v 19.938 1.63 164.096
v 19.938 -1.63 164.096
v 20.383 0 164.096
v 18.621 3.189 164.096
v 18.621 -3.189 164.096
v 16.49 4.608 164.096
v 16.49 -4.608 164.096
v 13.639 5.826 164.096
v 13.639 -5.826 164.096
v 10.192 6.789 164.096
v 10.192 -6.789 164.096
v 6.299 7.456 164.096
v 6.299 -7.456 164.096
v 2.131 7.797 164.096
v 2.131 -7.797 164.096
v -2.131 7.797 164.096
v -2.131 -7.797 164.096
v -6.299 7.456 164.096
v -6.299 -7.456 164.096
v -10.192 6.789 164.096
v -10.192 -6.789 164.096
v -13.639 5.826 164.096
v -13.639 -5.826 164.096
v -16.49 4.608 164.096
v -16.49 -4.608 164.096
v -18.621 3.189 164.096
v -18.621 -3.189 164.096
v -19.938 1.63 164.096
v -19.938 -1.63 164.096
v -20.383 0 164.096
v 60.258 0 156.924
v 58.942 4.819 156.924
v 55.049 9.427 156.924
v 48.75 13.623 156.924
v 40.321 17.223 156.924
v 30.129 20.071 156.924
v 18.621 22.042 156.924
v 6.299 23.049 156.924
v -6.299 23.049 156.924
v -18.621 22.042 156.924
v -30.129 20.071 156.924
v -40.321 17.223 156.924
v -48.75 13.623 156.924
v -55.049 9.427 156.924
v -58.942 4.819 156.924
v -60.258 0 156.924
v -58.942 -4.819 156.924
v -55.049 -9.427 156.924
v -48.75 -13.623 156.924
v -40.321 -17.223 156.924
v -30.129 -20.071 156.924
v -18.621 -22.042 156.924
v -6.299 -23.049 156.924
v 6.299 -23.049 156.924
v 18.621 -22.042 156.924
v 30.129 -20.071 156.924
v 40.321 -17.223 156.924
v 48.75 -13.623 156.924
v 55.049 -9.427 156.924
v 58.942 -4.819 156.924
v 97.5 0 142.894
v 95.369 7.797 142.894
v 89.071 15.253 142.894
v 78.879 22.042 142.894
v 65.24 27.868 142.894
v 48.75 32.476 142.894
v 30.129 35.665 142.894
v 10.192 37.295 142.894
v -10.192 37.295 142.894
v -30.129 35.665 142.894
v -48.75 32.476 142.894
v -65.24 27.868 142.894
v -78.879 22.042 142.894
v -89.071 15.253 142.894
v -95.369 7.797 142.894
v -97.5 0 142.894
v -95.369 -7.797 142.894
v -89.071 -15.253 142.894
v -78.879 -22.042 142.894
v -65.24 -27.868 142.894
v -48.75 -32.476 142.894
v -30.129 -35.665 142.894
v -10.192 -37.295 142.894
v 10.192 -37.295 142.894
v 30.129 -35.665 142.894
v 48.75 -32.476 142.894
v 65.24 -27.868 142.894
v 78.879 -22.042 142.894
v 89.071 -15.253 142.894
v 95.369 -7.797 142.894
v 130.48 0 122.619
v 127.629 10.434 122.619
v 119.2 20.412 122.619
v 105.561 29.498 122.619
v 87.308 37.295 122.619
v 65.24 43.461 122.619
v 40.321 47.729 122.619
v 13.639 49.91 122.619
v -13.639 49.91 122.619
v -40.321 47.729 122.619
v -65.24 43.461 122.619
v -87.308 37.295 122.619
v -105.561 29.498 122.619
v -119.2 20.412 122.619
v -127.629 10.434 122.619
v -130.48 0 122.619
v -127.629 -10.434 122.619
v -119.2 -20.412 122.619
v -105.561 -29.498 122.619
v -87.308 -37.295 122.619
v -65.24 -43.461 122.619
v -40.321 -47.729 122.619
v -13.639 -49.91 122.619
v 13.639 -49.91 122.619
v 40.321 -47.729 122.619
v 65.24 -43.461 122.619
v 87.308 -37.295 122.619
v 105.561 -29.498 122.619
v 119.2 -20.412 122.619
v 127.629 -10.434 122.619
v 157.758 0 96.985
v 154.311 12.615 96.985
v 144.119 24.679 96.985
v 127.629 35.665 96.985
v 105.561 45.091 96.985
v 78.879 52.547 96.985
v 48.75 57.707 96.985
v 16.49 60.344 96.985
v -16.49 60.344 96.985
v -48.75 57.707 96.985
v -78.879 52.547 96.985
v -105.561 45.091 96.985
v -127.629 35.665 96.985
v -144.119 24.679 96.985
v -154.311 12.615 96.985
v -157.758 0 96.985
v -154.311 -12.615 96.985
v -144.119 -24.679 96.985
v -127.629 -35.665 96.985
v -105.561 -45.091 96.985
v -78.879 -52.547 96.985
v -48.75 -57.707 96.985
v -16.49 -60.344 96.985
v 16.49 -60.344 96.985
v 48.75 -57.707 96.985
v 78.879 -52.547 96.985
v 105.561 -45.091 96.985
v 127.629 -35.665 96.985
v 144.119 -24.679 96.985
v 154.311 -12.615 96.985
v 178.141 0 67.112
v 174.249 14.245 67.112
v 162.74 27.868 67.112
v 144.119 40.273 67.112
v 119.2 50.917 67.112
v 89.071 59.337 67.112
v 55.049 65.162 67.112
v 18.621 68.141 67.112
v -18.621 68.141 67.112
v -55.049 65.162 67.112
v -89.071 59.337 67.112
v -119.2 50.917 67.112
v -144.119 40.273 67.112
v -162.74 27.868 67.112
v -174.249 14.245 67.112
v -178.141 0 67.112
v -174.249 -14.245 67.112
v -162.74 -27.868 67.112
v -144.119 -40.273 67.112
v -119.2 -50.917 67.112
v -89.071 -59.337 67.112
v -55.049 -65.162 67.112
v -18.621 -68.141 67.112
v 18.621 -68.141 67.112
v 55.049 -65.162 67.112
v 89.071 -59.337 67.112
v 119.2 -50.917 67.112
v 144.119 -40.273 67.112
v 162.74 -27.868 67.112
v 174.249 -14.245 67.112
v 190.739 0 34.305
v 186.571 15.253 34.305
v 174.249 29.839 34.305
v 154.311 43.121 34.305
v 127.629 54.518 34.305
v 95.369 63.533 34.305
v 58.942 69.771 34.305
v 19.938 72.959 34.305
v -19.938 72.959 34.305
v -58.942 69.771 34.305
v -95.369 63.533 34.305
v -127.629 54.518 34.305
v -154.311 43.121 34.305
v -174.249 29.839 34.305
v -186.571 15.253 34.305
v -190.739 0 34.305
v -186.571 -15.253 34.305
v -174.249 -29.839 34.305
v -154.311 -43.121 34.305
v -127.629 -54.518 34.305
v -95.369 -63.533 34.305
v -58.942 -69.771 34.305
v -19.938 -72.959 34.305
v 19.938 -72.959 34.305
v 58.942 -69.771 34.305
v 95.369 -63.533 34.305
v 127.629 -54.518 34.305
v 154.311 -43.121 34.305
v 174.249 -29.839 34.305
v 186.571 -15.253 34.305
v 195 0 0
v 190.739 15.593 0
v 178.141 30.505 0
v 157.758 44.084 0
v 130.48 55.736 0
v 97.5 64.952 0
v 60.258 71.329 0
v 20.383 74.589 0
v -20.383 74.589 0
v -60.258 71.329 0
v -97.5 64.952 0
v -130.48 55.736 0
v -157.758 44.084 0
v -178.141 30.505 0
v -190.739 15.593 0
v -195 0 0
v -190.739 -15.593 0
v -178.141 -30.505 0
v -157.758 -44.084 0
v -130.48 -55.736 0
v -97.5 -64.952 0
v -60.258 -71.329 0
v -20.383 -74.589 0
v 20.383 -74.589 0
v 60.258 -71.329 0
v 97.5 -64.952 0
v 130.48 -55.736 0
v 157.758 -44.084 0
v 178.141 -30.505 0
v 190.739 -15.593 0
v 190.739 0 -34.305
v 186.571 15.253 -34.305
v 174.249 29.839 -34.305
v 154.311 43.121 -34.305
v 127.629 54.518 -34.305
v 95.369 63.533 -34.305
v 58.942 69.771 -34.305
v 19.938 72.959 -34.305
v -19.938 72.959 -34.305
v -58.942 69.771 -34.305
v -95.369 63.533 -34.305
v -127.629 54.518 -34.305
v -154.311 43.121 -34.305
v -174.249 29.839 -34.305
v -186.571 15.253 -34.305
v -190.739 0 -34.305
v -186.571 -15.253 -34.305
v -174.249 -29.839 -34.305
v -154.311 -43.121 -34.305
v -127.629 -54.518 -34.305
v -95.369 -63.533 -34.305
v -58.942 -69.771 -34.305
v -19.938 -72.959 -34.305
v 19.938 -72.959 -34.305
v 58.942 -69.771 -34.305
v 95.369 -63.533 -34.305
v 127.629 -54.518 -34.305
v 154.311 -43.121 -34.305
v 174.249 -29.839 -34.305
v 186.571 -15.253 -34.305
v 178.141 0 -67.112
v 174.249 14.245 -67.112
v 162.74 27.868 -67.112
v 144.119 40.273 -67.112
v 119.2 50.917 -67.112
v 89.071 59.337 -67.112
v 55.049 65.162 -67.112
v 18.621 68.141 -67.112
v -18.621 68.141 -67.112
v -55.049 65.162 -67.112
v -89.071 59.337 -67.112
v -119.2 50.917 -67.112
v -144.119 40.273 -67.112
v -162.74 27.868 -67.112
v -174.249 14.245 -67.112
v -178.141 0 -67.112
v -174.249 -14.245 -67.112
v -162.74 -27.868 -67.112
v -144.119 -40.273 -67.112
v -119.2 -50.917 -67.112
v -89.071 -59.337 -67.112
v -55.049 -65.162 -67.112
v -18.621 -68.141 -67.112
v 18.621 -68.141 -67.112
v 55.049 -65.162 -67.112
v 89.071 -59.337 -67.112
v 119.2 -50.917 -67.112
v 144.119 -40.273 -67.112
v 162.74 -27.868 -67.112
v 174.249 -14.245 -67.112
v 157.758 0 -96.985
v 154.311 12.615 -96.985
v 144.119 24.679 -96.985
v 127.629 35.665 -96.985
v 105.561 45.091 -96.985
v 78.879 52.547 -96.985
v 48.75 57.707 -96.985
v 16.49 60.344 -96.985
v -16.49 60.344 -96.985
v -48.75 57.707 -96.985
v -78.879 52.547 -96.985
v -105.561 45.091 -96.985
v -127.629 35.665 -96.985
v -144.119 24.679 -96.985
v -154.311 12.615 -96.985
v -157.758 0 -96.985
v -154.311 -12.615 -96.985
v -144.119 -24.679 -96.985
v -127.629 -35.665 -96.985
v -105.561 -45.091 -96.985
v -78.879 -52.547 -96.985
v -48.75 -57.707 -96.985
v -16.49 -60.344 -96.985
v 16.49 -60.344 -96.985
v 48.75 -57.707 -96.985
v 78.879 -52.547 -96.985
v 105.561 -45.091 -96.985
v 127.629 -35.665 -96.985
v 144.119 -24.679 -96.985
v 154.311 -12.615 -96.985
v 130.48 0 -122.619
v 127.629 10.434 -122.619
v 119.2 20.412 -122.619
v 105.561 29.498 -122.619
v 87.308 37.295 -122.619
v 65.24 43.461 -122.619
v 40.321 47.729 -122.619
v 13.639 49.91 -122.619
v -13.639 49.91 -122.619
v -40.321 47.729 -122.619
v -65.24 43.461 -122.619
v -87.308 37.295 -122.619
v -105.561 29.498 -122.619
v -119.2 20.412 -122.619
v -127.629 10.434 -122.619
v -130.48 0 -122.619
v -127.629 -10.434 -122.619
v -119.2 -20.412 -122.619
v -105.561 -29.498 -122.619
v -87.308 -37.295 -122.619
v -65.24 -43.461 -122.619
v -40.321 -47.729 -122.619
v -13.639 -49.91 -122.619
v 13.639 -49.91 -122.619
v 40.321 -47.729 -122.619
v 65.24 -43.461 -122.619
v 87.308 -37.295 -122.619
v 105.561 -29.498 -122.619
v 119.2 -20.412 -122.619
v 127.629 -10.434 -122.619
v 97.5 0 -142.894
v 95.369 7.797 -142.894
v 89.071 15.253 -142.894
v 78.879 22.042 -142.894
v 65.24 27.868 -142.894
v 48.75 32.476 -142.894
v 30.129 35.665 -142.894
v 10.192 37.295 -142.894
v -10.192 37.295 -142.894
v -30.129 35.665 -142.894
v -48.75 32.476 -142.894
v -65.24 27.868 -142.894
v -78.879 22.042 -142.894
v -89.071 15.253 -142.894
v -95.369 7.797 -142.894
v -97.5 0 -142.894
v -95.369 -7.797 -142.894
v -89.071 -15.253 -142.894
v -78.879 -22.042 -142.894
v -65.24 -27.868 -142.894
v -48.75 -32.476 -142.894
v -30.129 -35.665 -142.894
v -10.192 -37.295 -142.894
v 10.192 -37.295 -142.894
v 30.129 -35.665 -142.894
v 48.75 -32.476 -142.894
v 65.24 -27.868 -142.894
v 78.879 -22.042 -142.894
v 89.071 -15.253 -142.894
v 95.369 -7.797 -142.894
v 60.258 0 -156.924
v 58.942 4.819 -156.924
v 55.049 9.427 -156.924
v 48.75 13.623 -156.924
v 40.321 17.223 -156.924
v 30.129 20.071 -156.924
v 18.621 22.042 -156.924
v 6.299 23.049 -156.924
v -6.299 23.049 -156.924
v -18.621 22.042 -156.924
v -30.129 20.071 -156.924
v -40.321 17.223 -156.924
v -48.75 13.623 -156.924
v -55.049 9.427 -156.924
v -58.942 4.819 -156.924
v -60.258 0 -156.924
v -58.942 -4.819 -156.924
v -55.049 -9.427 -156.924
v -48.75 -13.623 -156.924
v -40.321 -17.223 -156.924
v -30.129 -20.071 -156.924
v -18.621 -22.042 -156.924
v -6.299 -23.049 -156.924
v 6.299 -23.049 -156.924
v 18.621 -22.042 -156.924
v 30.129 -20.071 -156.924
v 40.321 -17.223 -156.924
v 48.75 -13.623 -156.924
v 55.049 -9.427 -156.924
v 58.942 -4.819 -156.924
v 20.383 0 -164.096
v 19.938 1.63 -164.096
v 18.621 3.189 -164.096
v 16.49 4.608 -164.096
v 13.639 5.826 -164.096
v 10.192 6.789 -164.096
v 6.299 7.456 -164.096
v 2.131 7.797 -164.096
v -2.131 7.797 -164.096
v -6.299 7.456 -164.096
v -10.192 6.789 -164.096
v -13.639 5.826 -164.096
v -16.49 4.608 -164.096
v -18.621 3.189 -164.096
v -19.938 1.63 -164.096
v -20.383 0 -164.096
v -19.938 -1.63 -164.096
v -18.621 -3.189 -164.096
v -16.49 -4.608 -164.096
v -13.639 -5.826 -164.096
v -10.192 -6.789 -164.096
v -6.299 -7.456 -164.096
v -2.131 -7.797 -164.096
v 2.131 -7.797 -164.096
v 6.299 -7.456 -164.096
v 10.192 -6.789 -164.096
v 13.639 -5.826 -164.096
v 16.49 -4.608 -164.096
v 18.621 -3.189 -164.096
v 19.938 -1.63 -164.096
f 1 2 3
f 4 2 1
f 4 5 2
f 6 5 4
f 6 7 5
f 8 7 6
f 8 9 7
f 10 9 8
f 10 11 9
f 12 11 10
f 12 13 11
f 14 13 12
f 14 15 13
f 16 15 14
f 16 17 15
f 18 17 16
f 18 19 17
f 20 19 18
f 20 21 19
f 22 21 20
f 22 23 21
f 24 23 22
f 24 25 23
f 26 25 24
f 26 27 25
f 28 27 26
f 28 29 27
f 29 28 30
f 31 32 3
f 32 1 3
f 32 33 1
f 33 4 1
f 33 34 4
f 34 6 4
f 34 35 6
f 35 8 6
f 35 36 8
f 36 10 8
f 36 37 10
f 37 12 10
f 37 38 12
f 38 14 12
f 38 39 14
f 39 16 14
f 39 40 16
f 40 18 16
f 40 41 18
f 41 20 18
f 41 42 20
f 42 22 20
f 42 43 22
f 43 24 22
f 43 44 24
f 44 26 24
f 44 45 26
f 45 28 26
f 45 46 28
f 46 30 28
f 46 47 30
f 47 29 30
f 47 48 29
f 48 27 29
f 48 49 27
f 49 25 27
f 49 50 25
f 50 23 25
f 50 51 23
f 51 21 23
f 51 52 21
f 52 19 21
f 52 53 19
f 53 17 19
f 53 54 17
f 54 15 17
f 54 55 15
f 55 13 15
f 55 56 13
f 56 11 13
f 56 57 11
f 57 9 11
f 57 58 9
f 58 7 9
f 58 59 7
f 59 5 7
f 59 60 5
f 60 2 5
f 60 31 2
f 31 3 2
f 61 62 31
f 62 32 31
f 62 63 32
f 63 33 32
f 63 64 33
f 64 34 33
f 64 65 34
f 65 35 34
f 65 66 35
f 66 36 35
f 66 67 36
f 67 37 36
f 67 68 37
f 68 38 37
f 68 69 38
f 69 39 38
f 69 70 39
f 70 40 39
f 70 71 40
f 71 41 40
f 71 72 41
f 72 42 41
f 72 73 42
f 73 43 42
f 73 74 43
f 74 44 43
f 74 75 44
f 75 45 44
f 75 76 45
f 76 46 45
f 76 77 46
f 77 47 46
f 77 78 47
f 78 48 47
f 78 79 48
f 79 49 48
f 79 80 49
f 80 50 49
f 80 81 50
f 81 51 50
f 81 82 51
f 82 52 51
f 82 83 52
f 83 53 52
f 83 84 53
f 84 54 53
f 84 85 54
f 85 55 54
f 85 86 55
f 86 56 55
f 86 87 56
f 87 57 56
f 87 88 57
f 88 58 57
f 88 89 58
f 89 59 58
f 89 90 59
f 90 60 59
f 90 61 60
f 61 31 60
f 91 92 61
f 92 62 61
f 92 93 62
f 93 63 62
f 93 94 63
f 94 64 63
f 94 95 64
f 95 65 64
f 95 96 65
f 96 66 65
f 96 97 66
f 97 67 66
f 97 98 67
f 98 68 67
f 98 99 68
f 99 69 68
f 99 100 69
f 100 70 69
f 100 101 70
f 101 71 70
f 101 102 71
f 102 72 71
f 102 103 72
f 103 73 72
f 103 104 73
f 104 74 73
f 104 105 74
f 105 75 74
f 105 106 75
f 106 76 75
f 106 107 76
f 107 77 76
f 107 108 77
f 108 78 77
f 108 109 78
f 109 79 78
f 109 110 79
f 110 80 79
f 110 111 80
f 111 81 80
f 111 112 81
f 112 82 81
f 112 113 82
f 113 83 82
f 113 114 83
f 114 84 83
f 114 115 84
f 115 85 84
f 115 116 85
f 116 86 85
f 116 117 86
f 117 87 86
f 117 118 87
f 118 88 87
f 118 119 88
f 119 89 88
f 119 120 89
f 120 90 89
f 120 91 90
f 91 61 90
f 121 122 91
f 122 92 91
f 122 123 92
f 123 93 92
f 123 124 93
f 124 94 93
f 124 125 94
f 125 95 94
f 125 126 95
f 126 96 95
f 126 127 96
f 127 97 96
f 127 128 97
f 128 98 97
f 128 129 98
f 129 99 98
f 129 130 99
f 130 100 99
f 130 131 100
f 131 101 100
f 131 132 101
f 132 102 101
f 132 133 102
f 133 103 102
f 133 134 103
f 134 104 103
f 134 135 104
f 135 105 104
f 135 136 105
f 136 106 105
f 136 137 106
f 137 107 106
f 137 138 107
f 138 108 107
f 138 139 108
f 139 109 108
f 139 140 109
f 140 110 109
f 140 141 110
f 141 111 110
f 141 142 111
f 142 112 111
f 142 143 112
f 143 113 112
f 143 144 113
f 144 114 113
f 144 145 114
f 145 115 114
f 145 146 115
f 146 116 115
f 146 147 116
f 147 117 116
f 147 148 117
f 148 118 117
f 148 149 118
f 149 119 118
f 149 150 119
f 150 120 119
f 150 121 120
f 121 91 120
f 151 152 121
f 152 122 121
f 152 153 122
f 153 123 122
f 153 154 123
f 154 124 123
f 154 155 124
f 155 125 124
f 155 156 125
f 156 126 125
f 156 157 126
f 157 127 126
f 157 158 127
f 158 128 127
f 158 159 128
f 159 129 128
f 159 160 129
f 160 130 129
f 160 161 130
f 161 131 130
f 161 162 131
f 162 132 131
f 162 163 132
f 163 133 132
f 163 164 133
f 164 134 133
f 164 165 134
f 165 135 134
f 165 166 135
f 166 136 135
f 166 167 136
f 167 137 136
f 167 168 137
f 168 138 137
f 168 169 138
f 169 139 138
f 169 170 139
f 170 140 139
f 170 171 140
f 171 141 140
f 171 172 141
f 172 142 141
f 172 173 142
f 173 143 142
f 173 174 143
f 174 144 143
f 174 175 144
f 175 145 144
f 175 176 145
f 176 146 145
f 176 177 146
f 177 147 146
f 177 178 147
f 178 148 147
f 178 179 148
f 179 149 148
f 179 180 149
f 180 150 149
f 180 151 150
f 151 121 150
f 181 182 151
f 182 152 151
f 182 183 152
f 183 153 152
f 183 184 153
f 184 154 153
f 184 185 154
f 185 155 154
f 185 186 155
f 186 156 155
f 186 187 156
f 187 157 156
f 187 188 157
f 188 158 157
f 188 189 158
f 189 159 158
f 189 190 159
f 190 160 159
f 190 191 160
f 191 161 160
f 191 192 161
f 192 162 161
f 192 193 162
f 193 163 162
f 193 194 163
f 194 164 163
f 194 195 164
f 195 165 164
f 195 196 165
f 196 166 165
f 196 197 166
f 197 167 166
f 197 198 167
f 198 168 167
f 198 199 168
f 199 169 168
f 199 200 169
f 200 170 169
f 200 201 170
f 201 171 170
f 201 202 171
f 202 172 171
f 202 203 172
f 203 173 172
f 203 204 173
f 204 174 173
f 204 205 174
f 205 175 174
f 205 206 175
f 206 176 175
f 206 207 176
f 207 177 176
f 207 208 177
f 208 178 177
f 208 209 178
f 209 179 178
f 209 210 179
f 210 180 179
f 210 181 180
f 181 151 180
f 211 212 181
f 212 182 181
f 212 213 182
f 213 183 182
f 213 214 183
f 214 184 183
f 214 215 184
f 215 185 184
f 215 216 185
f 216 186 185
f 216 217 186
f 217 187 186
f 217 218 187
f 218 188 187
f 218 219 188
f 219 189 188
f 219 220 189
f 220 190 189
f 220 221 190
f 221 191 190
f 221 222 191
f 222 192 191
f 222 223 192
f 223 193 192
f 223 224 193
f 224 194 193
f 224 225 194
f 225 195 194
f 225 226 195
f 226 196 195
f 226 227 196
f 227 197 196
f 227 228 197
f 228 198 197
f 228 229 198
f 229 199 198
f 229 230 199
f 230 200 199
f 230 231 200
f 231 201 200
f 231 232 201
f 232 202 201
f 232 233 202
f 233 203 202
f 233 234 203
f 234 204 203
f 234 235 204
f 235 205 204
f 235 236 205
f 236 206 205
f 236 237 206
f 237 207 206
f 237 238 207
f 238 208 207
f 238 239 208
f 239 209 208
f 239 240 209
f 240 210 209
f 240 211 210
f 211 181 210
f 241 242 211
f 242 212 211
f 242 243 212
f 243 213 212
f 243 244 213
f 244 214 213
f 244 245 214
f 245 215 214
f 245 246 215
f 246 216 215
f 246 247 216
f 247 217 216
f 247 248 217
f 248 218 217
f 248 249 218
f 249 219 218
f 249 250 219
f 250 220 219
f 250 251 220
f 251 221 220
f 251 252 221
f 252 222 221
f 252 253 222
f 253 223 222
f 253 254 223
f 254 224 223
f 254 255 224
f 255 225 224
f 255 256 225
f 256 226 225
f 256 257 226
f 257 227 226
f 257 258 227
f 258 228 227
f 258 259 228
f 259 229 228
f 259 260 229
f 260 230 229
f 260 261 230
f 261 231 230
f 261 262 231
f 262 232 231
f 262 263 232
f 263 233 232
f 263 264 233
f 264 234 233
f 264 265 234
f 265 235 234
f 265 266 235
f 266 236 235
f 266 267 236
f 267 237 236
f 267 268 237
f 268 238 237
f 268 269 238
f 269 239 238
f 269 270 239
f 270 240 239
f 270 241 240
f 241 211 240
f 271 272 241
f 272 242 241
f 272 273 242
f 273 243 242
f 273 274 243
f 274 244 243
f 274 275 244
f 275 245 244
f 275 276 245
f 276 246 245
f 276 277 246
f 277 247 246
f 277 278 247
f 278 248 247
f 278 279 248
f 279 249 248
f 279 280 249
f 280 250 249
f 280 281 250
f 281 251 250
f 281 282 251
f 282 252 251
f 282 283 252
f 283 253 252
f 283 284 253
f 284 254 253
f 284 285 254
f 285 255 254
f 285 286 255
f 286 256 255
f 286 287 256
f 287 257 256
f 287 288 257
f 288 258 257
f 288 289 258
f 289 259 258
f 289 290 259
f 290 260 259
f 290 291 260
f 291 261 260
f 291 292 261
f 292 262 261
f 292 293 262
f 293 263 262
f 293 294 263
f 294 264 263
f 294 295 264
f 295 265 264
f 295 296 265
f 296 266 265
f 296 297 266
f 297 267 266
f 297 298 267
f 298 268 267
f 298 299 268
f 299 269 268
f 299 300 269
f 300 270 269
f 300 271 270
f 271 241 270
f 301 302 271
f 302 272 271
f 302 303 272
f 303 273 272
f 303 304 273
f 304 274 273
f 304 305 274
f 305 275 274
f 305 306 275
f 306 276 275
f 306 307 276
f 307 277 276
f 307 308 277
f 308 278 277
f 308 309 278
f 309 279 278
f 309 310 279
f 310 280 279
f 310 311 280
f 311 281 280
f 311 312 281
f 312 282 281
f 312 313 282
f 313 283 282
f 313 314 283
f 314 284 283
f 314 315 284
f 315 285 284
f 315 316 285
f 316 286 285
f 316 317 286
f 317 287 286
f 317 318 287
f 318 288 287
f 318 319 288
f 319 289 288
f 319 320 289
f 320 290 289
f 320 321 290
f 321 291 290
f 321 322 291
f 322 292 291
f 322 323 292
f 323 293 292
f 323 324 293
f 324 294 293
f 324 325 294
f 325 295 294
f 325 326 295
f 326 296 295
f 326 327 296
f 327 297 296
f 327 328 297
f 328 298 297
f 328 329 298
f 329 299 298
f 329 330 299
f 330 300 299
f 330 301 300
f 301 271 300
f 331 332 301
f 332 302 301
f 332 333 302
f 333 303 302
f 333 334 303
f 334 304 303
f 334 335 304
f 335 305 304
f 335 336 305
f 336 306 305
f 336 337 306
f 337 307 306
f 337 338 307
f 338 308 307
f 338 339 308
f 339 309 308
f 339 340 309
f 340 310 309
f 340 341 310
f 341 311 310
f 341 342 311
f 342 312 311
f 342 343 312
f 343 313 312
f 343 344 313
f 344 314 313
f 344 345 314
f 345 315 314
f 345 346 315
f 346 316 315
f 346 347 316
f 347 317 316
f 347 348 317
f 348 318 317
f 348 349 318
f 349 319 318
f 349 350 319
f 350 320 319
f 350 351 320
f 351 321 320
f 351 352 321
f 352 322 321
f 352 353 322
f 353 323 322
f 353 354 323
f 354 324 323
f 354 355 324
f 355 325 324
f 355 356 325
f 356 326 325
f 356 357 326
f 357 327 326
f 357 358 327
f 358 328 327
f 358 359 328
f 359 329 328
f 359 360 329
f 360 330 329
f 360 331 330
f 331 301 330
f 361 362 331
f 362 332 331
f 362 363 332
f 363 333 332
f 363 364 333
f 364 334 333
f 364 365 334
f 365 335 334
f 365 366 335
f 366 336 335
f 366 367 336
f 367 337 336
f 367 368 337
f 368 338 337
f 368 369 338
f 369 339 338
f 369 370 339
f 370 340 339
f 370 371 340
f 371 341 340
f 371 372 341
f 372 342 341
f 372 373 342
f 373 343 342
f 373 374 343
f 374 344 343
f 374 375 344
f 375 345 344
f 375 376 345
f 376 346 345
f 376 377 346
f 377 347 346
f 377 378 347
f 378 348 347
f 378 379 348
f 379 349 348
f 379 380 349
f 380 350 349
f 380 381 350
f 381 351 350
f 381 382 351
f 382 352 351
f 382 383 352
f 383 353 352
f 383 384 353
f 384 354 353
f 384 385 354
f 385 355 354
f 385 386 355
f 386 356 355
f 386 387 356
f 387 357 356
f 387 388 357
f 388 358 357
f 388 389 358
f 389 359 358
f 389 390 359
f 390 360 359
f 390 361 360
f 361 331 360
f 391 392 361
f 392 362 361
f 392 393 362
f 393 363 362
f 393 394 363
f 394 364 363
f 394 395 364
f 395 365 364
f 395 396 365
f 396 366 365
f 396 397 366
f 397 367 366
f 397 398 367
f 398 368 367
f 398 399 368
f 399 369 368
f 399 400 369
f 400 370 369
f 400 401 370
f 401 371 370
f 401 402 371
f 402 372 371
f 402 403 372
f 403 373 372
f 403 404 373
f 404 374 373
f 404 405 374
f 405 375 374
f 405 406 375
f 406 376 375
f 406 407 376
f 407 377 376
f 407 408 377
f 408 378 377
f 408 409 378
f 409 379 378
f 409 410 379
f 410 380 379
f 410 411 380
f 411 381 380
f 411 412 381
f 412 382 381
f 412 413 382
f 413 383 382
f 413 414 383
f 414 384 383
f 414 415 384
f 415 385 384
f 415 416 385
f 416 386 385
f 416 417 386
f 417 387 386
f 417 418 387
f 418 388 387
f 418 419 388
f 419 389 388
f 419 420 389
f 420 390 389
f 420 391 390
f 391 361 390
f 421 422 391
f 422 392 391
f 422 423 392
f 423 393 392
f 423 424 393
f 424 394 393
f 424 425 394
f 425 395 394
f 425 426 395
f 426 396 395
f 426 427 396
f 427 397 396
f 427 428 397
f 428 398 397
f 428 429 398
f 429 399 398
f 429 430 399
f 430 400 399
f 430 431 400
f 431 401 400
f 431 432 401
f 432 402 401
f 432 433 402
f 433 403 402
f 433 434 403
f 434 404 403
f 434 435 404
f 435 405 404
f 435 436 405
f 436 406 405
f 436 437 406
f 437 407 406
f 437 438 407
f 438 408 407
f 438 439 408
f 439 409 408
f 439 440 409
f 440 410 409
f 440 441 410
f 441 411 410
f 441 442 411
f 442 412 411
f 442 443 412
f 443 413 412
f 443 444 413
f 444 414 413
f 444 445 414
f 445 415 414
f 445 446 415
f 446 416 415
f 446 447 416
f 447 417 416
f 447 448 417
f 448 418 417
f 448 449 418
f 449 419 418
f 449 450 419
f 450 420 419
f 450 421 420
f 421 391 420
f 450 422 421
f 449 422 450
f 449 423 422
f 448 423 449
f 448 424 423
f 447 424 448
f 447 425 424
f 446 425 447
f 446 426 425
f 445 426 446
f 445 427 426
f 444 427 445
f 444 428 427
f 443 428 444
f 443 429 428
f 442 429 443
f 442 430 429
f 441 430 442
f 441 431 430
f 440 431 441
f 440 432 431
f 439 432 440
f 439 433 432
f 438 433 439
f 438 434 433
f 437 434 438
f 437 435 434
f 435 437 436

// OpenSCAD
// Generated by SolidPython 1.0.1 on 2020-07-29 00:46:50


scale(v = [13, 5, 11]) {
	sphere(r = 15);
}
/***********************************************
*********      SolidPython code:      **********
************************************************
 
# import packages: SolidPython
from solid import *
from solid.utils import *
from itertools import chain, combinations, permutations


class Resize:

    def __init__(self, scad_file):
        self.scad_file = scad_file
        #self.scad_file = import_scad(scad_file)
        # cone/cylinder param:
        self.r1 = 0
        self.r2 = 0
        self.h = 0
        # rectangular prism param:
        self.w = 0
        self.l = 0
        # ellipse param:
        self.r = 0

    # import OpenScad code (file name corresponds to shape)


    # classify shape + parameters
    def assign(self, param1, param2, param3):
        if self.scad_file == 'cone.scad':
            self.r1 = param1
            self.r2 = param2
            self.h = param3
        elif self.scad_file == 'cylinder.scad':
            self.r1 = param1
            self.r2 = param2
            self.h = param3
        elif self.scad_file == 'rectangularPrism.scad':
            self.h = param1
            self.l = param2
            self.w = param3
        else:
            self.r = param1
            self.h = param2

    # resize parameters
    def iterate(self):
        x = range(3, 20, 2)
        i = 1
        if self.scad_file == 'cone.scad':
            tempList = list(permutations(x, 2))
            for temp in tempList:
                param1 = temp[0]
                param2 = temp[1]
                filepath = 'produced_scad_files/' + 'cone' + str(param1) + '_' + str(param2) + '_' + '.scad'
                scad_render_to_file(cylinder(h=param1, r1=param2, r2=0), filepath)

        elif self.scad_file == 'cylinder.scad':
            tempList = list(permutations(x, 3))
            for temp in tempList:
                param1 = temp[0]
                param2 = temp[1]
                filepath = 'produced_scad_files/' + 'cylinder' + str(param1) + '_' + str(param2) + '_' + '.scad'
                scad_render_to_file(cylinder(h=param1, r1=param2, r2=param2), filepath)

        elif self.scad_file == 'rectangularPrism.scad':
            tempList = list(permutations(x, 3))
            for temp in tempList:
                param1 = temp[0]
                param2 = temp[1]
                param3 = temp[2]
                filepath = 'produced_scad_files/' + 'rectangularPrism' + str(param1) + '_' + str(param2) + '_' + str(
                    param3) + '.scad'
                scad_render_to_file(cube(size=(param1, param2, param3)), filepath)

        elif self.scad_file == 'ellipse.scad':
            tempList = list(permutations(x, 4))
            for temp in tempList:
                param1 = temp[0]
                param2 = temp[1]
                param3 = temp[2]
                param4 = temp[3]
                filepath = 'produced_scad_files/' + 'ellipse' + str(param1) + '_' + str(param2) + '_' + str(param3) + '_' + str(param4) + '.scad'
                scad_render_to_file(scale([param1, param2, param3])(sphere(r=param4)), filepath)

    def render_to_scadfile(self):
        scad_render_to_file(scad, 'example.scad') 
 
************************************************/
